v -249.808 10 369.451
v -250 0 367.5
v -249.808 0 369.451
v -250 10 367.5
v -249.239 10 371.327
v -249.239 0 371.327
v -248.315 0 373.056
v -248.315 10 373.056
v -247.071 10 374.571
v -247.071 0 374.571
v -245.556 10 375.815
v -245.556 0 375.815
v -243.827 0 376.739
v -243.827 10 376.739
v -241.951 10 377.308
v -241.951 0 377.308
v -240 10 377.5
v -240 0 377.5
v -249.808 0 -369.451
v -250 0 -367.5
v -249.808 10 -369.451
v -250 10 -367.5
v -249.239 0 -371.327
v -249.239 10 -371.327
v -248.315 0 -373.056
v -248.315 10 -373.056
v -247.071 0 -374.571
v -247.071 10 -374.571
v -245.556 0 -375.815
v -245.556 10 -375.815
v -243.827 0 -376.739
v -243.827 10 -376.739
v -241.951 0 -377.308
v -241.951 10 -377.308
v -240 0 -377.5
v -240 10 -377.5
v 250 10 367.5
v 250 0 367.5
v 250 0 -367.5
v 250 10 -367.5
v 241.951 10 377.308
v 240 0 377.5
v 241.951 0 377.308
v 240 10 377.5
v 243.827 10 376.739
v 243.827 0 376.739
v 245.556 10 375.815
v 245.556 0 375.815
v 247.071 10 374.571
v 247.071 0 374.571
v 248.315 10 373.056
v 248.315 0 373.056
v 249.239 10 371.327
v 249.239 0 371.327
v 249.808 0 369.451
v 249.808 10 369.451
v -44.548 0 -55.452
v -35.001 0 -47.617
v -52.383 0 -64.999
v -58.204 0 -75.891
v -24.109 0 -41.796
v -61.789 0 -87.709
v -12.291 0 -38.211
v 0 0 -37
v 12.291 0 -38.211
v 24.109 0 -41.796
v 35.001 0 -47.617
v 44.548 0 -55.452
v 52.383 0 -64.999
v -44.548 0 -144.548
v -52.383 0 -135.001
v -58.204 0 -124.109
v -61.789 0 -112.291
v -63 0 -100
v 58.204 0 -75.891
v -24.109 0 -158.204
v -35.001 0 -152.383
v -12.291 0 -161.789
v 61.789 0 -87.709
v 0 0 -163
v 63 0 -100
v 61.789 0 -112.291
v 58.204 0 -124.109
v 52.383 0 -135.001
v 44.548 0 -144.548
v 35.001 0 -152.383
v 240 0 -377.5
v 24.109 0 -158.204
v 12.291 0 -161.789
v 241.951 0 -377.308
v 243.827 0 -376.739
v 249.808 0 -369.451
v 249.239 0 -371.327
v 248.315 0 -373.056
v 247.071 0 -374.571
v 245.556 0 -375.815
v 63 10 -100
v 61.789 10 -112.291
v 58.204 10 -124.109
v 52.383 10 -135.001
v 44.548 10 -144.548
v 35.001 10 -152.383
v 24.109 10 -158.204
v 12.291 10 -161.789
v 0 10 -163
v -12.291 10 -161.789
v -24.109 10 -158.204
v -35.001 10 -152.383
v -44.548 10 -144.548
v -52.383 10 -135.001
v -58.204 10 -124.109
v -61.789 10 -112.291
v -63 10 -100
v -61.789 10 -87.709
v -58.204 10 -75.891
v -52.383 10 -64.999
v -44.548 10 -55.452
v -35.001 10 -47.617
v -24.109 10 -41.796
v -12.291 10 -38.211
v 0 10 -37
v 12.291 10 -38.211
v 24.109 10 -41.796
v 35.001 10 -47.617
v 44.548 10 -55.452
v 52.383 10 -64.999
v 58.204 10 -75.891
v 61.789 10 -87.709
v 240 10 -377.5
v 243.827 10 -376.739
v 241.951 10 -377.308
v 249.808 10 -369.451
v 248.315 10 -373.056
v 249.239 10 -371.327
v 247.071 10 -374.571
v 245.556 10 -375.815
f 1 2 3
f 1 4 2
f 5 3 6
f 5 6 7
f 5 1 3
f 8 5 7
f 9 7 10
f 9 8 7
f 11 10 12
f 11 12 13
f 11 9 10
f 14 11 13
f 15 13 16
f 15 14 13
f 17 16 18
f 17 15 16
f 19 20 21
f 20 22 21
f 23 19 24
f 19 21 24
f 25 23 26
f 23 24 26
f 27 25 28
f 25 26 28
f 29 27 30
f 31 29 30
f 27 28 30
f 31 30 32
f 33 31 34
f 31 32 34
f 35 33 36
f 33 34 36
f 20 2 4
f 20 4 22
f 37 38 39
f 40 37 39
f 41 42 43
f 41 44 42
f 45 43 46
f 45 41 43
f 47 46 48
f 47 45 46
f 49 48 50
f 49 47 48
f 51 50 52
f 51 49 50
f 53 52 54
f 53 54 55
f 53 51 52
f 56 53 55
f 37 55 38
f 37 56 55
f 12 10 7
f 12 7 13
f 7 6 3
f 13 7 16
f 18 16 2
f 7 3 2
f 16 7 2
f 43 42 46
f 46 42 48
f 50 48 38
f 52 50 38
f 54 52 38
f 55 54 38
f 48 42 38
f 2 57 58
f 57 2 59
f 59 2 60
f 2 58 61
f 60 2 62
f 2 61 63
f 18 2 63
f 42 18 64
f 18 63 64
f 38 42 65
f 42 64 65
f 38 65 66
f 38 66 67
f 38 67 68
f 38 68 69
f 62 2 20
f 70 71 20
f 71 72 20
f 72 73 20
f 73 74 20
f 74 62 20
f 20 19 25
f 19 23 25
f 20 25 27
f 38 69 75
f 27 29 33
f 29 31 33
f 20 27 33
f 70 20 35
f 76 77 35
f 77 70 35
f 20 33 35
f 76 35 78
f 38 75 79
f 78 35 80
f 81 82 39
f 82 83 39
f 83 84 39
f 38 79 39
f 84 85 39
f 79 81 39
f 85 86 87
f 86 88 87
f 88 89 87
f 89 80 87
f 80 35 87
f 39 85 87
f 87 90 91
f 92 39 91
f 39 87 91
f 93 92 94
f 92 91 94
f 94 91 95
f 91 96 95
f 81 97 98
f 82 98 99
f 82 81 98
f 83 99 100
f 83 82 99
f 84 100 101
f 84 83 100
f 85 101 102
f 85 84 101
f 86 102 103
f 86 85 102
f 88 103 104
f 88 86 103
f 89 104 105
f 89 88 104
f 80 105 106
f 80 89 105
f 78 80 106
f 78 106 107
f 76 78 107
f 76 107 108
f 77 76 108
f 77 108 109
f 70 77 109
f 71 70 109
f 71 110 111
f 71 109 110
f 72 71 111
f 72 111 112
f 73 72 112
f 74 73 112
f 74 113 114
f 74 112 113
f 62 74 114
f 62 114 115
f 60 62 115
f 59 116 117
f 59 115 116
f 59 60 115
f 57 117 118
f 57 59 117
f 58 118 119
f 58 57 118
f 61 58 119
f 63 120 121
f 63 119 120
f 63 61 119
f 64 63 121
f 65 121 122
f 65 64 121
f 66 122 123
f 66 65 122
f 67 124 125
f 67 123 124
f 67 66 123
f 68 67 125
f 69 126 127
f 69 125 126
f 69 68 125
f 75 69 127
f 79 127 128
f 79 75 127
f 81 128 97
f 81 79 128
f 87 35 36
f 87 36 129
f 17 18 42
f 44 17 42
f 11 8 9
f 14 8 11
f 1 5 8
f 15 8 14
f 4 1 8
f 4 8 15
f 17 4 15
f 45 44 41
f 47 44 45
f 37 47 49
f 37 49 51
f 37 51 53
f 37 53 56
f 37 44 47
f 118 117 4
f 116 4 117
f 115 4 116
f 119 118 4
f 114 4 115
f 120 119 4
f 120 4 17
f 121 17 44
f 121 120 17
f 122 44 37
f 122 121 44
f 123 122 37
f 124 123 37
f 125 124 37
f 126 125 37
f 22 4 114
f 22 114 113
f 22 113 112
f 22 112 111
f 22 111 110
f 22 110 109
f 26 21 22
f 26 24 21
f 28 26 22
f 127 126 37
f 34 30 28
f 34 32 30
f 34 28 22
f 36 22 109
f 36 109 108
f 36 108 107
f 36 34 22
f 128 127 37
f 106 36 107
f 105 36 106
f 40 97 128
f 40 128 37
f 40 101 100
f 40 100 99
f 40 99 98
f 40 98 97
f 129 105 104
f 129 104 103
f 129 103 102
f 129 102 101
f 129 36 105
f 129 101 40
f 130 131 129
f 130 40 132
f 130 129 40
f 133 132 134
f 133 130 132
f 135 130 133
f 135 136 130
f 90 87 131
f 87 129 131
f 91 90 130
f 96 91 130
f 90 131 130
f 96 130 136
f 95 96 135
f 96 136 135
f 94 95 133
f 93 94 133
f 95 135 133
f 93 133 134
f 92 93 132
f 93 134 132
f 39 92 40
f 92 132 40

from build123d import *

# Parameters (mm, degrees)
SKETCH1_W           = 500
SKETCH1_H           = 755
BOSS_EXTRUDE1_DEPTH = 10
SKETCH3_R           = 63
CUT_EXTRUDE10_DEPTH = 11
FILLET1_R           = 10


with BuildPart() as part:
    # Sketch1 → Boss-Extrude1 (new body)
    with BuildSketch(Plane(origin=(0, 0, 0), x_dir=(1, 0, 0), z_dir=(0, 1, 0))):
        Rectangle(SKETCH1_W, SKETCH1_H)
    extrude(amount=BOSS_EXTRUDE1_DEPTH)

    # Sketch3 → Cut-Extrude10 (cut, through all)
    with BuildSketch(Plane(origin=(0, 0, 0), x_dir=(1, 0, 0), z_dir=(0, 1, 0))):
        with Locations((0, 100)):
            Circle(SKETCH3_R)
    extrude(amount=CUT_EXTRUDE10_DEPTH, mode=Mode.SUBTRACT)

    # Fillet1
    fillet1_edges = [part.edges().sort_by_distance(p)[0] for p in [
        (-250, 5, 377.5),
        (-250, 5, -377.5),
        (250, 5, -377.5),
        (250, 5, 377.5),
    ]]
    fillet(fillet1_edges, radius=FILLET1_R)


solid = part.part
